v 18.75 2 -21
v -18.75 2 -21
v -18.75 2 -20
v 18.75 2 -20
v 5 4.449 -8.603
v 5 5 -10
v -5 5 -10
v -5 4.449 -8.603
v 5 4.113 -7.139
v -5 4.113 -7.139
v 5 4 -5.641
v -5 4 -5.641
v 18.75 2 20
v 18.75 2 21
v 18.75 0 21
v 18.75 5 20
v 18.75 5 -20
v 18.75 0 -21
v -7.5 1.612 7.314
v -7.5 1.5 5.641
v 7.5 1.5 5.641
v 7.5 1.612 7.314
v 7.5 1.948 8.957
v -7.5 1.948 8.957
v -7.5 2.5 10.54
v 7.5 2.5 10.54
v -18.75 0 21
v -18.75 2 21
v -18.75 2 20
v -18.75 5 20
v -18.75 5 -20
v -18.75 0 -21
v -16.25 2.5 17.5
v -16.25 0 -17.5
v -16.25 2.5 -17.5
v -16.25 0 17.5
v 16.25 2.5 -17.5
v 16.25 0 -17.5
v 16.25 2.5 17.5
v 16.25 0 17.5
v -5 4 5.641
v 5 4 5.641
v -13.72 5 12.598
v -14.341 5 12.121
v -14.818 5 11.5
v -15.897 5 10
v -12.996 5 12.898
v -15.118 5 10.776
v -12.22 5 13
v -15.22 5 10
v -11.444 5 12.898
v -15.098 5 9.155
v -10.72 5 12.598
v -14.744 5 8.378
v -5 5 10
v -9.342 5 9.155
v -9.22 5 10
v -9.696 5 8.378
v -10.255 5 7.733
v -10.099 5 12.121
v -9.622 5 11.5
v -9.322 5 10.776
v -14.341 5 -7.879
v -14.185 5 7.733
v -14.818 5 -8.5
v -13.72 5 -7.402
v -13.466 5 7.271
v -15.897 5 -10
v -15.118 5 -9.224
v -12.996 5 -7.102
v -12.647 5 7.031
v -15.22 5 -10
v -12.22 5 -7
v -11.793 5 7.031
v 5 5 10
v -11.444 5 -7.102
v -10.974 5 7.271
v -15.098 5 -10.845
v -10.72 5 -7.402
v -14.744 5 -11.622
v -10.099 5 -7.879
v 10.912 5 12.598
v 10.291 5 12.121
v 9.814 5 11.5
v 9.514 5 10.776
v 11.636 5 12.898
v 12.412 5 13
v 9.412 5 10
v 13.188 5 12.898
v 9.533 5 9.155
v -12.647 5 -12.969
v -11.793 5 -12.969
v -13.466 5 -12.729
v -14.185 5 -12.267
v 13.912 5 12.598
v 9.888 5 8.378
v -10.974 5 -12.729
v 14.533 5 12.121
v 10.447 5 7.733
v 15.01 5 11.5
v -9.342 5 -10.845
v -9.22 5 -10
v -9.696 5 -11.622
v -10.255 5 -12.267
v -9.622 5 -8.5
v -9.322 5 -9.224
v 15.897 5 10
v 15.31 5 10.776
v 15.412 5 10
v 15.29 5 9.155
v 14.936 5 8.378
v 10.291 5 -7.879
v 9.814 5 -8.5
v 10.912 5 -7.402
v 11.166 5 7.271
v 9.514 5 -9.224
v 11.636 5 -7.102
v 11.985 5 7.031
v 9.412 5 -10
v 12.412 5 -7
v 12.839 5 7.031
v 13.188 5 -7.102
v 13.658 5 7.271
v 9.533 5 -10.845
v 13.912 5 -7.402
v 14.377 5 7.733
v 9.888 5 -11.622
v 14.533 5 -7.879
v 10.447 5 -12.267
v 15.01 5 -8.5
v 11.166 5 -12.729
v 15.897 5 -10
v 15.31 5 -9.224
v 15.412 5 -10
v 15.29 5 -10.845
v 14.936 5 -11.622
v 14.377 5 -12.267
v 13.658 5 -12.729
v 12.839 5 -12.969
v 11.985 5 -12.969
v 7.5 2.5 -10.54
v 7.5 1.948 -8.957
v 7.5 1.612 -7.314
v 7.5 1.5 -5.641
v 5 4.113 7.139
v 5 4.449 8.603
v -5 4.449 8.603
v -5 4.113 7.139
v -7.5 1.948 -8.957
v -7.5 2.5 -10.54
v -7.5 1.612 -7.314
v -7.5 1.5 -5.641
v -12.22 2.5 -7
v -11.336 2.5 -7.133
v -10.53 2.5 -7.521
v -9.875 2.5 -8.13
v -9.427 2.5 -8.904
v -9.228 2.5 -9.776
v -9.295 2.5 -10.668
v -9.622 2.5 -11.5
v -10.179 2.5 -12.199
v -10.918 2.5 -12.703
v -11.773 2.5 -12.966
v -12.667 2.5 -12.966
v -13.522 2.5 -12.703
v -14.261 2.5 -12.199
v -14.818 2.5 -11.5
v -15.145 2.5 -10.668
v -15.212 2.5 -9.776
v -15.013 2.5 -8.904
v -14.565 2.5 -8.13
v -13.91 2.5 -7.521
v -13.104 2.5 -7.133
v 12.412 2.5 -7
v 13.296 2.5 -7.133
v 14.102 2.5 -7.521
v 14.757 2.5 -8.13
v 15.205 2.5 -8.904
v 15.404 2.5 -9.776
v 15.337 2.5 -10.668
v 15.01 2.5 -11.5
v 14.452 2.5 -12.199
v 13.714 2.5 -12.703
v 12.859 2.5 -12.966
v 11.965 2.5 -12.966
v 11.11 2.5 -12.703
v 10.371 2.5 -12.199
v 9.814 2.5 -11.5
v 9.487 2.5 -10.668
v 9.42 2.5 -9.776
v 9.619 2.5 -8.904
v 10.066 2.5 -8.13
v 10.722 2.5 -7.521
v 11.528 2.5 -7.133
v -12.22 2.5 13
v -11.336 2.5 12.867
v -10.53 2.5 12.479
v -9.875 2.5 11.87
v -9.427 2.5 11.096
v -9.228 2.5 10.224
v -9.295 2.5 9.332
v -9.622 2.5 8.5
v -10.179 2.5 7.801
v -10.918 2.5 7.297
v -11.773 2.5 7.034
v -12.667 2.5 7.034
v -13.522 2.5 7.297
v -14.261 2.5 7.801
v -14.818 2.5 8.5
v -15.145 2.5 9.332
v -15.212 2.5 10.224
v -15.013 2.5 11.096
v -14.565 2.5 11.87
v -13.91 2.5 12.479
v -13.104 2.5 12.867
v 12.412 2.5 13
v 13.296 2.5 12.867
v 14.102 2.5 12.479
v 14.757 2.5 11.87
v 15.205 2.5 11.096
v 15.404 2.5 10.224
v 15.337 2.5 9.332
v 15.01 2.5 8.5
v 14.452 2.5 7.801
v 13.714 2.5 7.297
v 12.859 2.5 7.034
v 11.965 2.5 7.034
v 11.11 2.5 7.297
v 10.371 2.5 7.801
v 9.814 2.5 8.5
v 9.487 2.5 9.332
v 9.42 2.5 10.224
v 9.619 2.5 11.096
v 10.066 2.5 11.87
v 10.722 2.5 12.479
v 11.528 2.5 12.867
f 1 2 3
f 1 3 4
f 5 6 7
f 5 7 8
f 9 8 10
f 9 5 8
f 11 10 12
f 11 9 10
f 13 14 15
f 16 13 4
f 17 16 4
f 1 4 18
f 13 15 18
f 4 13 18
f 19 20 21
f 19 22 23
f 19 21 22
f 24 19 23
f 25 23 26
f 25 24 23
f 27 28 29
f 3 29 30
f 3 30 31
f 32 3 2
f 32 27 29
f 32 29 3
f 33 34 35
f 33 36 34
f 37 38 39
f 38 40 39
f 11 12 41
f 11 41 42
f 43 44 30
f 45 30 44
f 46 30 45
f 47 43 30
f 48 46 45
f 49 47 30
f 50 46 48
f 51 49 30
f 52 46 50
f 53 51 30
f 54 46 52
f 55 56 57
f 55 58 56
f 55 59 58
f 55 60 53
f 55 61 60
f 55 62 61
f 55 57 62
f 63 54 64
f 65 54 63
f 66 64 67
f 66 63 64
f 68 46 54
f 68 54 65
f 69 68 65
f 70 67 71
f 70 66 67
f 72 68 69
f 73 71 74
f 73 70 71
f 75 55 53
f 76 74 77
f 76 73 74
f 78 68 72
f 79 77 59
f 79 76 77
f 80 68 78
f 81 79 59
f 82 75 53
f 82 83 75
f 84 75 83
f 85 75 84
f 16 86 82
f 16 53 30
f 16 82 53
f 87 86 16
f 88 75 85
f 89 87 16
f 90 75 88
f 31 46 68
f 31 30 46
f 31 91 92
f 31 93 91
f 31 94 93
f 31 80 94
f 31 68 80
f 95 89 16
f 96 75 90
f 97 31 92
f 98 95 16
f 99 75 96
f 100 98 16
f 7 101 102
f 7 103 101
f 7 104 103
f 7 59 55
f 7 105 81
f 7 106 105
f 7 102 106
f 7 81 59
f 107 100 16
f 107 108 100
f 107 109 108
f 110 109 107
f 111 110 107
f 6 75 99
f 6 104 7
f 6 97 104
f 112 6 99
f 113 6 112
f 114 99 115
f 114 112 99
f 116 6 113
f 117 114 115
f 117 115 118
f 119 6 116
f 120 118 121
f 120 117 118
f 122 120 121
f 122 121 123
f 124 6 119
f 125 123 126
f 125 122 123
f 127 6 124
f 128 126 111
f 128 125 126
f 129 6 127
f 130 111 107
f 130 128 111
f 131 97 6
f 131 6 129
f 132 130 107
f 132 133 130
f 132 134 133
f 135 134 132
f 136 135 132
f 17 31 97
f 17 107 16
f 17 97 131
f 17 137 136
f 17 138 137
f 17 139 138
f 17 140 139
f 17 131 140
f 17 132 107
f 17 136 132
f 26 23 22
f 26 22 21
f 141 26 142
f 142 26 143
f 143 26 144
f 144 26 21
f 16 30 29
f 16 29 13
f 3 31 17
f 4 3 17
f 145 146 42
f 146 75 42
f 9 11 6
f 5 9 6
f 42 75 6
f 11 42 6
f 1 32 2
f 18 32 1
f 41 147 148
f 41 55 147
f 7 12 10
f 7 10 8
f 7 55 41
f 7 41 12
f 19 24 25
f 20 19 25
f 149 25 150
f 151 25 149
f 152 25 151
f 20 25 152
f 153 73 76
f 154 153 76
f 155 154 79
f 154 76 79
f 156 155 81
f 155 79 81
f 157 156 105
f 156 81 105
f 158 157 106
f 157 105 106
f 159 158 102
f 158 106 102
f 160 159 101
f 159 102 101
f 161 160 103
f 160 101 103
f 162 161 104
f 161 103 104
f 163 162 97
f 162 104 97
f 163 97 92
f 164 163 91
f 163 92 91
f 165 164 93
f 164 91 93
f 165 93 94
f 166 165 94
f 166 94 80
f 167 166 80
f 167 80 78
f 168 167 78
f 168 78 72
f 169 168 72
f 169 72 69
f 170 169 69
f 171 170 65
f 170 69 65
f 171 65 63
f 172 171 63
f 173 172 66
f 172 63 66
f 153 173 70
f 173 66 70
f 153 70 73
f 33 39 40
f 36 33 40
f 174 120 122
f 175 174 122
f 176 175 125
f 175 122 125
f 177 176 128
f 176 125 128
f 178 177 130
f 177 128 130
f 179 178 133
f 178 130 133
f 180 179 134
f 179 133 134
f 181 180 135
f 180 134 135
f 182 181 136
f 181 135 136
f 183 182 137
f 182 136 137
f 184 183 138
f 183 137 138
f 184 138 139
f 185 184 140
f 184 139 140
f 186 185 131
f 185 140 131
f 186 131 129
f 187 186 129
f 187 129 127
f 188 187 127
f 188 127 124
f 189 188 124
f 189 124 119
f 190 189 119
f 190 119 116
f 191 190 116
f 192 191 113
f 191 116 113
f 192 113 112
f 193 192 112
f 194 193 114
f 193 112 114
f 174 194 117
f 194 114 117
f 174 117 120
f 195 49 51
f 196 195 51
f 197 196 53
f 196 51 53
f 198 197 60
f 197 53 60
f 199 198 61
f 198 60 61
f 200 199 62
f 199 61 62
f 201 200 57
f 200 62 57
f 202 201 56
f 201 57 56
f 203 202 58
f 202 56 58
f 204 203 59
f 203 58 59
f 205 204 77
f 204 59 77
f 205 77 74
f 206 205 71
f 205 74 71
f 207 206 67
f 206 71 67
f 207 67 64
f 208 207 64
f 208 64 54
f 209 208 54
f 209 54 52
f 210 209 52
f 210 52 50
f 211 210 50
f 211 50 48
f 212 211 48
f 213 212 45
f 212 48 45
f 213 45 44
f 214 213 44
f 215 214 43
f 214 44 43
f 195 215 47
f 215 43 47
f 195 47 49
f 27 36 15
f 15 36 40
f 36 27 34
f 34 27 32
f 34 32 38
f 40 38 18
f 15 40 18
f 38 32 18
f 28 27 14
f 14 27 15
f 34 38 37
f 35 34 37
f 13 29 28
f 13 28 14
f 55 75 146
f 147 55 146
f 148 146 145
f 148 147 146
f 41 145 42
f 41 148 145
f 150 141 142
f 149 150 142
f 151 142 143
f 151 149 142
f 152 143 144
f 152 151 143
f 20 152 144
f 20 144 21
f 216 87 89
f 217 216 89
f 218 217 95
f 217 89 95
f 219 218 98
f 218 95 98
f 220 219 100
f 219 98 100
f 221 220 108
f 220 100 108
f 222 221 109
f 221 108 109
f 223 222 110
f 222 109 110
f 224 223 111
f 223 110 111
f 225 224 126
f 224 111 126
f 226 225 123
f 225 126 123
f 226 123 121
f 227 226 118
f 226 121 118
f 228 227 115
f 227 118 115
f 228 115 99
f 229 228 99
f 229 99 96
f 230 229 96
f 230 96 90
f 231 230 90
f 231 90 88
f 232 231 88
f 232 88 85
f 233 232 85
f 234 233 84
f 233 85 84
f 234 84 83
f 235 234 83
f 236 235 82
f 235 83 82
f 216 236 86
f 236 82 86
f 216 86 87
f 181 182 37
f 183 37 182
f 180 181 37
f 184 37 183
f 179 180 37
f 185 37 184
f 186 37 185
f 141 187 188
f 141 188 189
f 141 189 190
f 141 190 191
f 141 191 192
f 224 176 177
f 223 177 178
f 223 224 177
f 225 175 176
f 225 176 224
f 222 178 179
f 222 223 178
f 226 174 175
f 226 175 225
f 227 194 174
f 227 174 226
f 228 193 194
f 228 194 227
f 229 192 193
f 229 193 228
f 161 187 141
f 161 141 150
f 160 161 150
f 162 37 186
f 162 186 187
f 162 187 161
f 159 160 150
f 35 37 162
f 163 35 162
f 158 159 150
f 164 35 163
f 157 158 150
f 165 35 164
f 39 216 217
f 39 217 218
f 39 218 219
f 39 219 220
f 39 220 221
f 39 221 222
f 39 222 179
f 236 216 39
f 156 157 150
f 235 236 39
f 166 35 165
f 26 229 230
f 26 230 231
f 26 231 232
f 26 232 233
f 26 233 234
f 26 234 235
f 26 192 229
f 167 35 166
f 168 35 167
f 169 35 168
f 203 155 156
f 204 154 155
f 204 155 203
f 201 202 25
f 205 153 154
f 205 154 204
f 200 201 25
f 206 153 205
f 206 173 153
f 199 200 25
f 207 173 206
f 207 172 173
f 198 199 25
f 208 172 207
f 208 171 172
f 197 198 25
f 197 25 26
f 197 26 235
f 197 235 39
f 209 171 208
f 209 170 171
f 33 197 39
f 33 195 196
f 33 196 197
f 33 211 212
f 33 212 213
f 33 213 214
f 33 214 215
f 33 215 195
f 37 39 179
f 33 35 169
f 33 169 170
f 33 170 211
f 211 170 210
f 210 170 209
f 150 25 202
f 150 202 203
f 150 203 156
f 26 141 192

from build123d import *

# Parameters (mm, degrees)
SKETCH1_W           = 37.5
SKETCH1_H           = 42
BOSS_EXTRUDE1_DEPTH = 5
SKETCH2_W           = 37.5
SKETCH2_H           = 1
CUT_EXTRUDE1_DEPTH  = 3
SKETCH3_W           = 37.5
SKETCH3_H           = 1
CUT_EXTRUDE2_DEPTH  = 3
SKETCH4_W           = 10
SKETCH4_H           = 20
CUT_EXTRUDE3_DEPTH  = 1
FILLET1_R           = 10
FILLET2_R           = 10
SHELL1_START        = -16.25
SHELL1_DEPTH        = 32.5
SHELL1_2_DEPTH      = 8.75
SHELL1_START_2      = 7.5
SHELL1_3_DEPTH      = 8.75
SKETCH5_R           = 3
CUT_EXTRUDE4_DEPTH  = 2.5


# Read off the part's stored shape, not the designer's step: Shell1
with BuildPart() as part:
    # Sketch1 → Boss-Extrude1 (new body)
    with BuildSketch(Plane(origin=(0, 0, 0), x_dir=(1, 0, 0), z_dir=(0, 1, 0))):
        Rectangle(SKETCH1_W, SKETCH1_H)
    extrude(amount=BOSS_EXTRUDE1_DEPTH)

    # Sketch2 → Cut-Extrude1 (cut)
    with BuildSketch(Plane(origin=(0, 5, 0), x_dir=(1, 0, 0), z_dir=(0, 1, 0))):
        with Locations((0, -20.5)):
            Rectangle(SKETCH2_W, SKETCH2_H)
    extrude(amount=-CUT_EXTRUDE1_DEPTH, mode=Mode.SUBTRACT)

    # Sketch3 → Cut-Extrude2 (cut)
    with BuildSketch(Plane(origin=(0, 5, 0), x_dir=(1, 0, 0), z_dir=(0, 1, 0))):
        with Locations((0, 20.5)):
            Rectangle(SKETCH3_W, SKETCH3_H)
    extrude(amount=-CUT_EXTRUDE2_DEPTH, mode=Mode.SUBTRACT)

    # Sketch4 → Cut-Extrude3 (cut)
    with BuildSketch(Plane(origin=(0, 5, 0), x_dir=(1, 0, 0), z_dir=(0, 1, 0))):
        Rectangle(SKETCH4_W, SKETCH4_H)
    extrude(amount=-CUT_EXTRUDE3_DEPTH, mode=Mode.SUBTRACT)

    # Fillet1
    # the kernel refuses this fillet: 10 mm, written as the material it adds along each edge
    with BuildSketch(Plane(origin=(15.897247359, 4, -10), x_dir=(0, 1, 0), z_dir=(-1, 0, 0))) as fillet1_piece_1:
        with BuildLine():
            CenterArc((10, -4.358898944), FILLET1_R, 154.158067237, 25.841932763)
            Line((0, -4.358898944), (-0.2, -4.358898944))
            Line((-0.2, -4.358898944), (-0.2, 0))
            Line((-0.2, 0), (0, 0.2))
            ThreePointArc((0, 0.2), (0.5, 0.2), (0.82, 0.087177979))
            Line((0.82, 0.087177979), (1, 0))
        make_face()
    extrude(amount=31.794494718)

    # Fillet2
    # the kernel refuses this fillet: 10 mm, written as the material it adds along each edge
    with BuildSketch(Plane(origin=(-15.897247359, 4, 10), x_dir=(0, 0, -1), z_dir=(1, 0, 0))) as fillet2_piece_1:
        with BuildLine():
            CenterArc((4.358898944, 10), FILLET2_R, 244.158067237, 25.841932763)
            Line((0, 1), (-0.087177979, 0.82))
            ThreePointArc((-0.087177979, 0.82), (-0.2, 0.5), (-0.2, 0))
            Line((-0.2, 0), (0, -0.2))
            Line((0, -0.2), (4.358898944, -0.2))
            Line((4.358898944, -0.2), (4.358898944, 0))
        make_face()
    extrude(amount=31.794494718)

    # Shell1 outline → Shell1 (cut)
    with BuildSketch(Plane.YZ.offset(SHELL1_START)):
        with BuildLine():
            Line((0, -17.5), (2.5, -17.5))
            Line((2.5, -17.5), (2.5, -10.540080542))
            ThreePointArc((2.5, -10.540080542), (1.752551286, -8.141101056), (1.5, -5.641101056))
            Line((1.5, -5.641101056), (1.5, 5.641101056))
            ThreePointArc((1.5, 5.641101056), (1.752551286, 8.141101056), (2.5, 10.540080542))
            Line((2.5, 10.540080542), (2.5, 17.5))
            Line((2.5, 17.5), (0, 17.5))
            Line((0, 17.5), (0, -17.5))
        make_face()
    extrude(amount=SHELL1_DEPTH, mode=Mode.SUBTRACT)

    # Shell1 2 outline → Shell1 2 (cut)
    with BuildSketch(Plane.YZ.offset(SHELL1_START)):
        with BuildLine():
            ThreePointArc((1.5, -5.641101056), (1.752551286, -8.141101056), (2.5, -10.540080542))
            Line((2.5, -10.540080542), (2.5, 10.540080542))
            ThreePointArc((2.5, 10.540080542), (1.752551286, 8.141101056), (1.5, 5.641101056))
            Line((1.5, 5.641101056), (1.5, -5.641101056))
        make_face()
    extrude(amount=SHELL1_2_DEPTH, mode=Mode.SUBTRACT)

    # Shell1 3 outline → Shell1 3 (cut)
    with BuildSketch(Plane.YZ.offset(SHELL1_START_2)):
        with BuildLine():
            ThreePointArc((1.5, -5.641101056), (1.752551286, -8.141101056), (2.5, -10.540080542))
            Line((2.5, -10.540080542), (2.5, 10.540080542))
            ThreePointArc((2.5, 10.540080542), (1.752551286, 8.141101056), (1.5, 5.641101056))
            Line((1.5, 5.641101056), (1.5, -5.641101056))
        make_face()
    extrude(amount=SHELL1_3_DEPTH, mode=Mode.SUBTRACT)

    # Sketch5 → Cut-Extrude4 (cut)
    with BuildSketch(Plane(origin=(0, 5, 0), x_dir=(1, 0, 0), z_dir=(0, 1, 0))):
        with Locations(Location((-12.220002529, -10, 0), (0, 0, 270))):
            Circle(SKETCH5_R)
        with Locations(Location((-12.220002529, 10, 0), (0, 0, 270))):
            Circle(SKETCH5_R)
        with Locations(Location((12.411971657, -10, 0), (0, 0, 270))):
            Circle(SKETCH5_R)
        with Locations(Location((12.411971657, 10, 0), (0, 0, 270))):
            Circle(SKETCH5_R)
    extrude(amount=-CUT_EXTRUDE4_DEPTH, mode=Mode.SUBTRACT)


solid = part.part
